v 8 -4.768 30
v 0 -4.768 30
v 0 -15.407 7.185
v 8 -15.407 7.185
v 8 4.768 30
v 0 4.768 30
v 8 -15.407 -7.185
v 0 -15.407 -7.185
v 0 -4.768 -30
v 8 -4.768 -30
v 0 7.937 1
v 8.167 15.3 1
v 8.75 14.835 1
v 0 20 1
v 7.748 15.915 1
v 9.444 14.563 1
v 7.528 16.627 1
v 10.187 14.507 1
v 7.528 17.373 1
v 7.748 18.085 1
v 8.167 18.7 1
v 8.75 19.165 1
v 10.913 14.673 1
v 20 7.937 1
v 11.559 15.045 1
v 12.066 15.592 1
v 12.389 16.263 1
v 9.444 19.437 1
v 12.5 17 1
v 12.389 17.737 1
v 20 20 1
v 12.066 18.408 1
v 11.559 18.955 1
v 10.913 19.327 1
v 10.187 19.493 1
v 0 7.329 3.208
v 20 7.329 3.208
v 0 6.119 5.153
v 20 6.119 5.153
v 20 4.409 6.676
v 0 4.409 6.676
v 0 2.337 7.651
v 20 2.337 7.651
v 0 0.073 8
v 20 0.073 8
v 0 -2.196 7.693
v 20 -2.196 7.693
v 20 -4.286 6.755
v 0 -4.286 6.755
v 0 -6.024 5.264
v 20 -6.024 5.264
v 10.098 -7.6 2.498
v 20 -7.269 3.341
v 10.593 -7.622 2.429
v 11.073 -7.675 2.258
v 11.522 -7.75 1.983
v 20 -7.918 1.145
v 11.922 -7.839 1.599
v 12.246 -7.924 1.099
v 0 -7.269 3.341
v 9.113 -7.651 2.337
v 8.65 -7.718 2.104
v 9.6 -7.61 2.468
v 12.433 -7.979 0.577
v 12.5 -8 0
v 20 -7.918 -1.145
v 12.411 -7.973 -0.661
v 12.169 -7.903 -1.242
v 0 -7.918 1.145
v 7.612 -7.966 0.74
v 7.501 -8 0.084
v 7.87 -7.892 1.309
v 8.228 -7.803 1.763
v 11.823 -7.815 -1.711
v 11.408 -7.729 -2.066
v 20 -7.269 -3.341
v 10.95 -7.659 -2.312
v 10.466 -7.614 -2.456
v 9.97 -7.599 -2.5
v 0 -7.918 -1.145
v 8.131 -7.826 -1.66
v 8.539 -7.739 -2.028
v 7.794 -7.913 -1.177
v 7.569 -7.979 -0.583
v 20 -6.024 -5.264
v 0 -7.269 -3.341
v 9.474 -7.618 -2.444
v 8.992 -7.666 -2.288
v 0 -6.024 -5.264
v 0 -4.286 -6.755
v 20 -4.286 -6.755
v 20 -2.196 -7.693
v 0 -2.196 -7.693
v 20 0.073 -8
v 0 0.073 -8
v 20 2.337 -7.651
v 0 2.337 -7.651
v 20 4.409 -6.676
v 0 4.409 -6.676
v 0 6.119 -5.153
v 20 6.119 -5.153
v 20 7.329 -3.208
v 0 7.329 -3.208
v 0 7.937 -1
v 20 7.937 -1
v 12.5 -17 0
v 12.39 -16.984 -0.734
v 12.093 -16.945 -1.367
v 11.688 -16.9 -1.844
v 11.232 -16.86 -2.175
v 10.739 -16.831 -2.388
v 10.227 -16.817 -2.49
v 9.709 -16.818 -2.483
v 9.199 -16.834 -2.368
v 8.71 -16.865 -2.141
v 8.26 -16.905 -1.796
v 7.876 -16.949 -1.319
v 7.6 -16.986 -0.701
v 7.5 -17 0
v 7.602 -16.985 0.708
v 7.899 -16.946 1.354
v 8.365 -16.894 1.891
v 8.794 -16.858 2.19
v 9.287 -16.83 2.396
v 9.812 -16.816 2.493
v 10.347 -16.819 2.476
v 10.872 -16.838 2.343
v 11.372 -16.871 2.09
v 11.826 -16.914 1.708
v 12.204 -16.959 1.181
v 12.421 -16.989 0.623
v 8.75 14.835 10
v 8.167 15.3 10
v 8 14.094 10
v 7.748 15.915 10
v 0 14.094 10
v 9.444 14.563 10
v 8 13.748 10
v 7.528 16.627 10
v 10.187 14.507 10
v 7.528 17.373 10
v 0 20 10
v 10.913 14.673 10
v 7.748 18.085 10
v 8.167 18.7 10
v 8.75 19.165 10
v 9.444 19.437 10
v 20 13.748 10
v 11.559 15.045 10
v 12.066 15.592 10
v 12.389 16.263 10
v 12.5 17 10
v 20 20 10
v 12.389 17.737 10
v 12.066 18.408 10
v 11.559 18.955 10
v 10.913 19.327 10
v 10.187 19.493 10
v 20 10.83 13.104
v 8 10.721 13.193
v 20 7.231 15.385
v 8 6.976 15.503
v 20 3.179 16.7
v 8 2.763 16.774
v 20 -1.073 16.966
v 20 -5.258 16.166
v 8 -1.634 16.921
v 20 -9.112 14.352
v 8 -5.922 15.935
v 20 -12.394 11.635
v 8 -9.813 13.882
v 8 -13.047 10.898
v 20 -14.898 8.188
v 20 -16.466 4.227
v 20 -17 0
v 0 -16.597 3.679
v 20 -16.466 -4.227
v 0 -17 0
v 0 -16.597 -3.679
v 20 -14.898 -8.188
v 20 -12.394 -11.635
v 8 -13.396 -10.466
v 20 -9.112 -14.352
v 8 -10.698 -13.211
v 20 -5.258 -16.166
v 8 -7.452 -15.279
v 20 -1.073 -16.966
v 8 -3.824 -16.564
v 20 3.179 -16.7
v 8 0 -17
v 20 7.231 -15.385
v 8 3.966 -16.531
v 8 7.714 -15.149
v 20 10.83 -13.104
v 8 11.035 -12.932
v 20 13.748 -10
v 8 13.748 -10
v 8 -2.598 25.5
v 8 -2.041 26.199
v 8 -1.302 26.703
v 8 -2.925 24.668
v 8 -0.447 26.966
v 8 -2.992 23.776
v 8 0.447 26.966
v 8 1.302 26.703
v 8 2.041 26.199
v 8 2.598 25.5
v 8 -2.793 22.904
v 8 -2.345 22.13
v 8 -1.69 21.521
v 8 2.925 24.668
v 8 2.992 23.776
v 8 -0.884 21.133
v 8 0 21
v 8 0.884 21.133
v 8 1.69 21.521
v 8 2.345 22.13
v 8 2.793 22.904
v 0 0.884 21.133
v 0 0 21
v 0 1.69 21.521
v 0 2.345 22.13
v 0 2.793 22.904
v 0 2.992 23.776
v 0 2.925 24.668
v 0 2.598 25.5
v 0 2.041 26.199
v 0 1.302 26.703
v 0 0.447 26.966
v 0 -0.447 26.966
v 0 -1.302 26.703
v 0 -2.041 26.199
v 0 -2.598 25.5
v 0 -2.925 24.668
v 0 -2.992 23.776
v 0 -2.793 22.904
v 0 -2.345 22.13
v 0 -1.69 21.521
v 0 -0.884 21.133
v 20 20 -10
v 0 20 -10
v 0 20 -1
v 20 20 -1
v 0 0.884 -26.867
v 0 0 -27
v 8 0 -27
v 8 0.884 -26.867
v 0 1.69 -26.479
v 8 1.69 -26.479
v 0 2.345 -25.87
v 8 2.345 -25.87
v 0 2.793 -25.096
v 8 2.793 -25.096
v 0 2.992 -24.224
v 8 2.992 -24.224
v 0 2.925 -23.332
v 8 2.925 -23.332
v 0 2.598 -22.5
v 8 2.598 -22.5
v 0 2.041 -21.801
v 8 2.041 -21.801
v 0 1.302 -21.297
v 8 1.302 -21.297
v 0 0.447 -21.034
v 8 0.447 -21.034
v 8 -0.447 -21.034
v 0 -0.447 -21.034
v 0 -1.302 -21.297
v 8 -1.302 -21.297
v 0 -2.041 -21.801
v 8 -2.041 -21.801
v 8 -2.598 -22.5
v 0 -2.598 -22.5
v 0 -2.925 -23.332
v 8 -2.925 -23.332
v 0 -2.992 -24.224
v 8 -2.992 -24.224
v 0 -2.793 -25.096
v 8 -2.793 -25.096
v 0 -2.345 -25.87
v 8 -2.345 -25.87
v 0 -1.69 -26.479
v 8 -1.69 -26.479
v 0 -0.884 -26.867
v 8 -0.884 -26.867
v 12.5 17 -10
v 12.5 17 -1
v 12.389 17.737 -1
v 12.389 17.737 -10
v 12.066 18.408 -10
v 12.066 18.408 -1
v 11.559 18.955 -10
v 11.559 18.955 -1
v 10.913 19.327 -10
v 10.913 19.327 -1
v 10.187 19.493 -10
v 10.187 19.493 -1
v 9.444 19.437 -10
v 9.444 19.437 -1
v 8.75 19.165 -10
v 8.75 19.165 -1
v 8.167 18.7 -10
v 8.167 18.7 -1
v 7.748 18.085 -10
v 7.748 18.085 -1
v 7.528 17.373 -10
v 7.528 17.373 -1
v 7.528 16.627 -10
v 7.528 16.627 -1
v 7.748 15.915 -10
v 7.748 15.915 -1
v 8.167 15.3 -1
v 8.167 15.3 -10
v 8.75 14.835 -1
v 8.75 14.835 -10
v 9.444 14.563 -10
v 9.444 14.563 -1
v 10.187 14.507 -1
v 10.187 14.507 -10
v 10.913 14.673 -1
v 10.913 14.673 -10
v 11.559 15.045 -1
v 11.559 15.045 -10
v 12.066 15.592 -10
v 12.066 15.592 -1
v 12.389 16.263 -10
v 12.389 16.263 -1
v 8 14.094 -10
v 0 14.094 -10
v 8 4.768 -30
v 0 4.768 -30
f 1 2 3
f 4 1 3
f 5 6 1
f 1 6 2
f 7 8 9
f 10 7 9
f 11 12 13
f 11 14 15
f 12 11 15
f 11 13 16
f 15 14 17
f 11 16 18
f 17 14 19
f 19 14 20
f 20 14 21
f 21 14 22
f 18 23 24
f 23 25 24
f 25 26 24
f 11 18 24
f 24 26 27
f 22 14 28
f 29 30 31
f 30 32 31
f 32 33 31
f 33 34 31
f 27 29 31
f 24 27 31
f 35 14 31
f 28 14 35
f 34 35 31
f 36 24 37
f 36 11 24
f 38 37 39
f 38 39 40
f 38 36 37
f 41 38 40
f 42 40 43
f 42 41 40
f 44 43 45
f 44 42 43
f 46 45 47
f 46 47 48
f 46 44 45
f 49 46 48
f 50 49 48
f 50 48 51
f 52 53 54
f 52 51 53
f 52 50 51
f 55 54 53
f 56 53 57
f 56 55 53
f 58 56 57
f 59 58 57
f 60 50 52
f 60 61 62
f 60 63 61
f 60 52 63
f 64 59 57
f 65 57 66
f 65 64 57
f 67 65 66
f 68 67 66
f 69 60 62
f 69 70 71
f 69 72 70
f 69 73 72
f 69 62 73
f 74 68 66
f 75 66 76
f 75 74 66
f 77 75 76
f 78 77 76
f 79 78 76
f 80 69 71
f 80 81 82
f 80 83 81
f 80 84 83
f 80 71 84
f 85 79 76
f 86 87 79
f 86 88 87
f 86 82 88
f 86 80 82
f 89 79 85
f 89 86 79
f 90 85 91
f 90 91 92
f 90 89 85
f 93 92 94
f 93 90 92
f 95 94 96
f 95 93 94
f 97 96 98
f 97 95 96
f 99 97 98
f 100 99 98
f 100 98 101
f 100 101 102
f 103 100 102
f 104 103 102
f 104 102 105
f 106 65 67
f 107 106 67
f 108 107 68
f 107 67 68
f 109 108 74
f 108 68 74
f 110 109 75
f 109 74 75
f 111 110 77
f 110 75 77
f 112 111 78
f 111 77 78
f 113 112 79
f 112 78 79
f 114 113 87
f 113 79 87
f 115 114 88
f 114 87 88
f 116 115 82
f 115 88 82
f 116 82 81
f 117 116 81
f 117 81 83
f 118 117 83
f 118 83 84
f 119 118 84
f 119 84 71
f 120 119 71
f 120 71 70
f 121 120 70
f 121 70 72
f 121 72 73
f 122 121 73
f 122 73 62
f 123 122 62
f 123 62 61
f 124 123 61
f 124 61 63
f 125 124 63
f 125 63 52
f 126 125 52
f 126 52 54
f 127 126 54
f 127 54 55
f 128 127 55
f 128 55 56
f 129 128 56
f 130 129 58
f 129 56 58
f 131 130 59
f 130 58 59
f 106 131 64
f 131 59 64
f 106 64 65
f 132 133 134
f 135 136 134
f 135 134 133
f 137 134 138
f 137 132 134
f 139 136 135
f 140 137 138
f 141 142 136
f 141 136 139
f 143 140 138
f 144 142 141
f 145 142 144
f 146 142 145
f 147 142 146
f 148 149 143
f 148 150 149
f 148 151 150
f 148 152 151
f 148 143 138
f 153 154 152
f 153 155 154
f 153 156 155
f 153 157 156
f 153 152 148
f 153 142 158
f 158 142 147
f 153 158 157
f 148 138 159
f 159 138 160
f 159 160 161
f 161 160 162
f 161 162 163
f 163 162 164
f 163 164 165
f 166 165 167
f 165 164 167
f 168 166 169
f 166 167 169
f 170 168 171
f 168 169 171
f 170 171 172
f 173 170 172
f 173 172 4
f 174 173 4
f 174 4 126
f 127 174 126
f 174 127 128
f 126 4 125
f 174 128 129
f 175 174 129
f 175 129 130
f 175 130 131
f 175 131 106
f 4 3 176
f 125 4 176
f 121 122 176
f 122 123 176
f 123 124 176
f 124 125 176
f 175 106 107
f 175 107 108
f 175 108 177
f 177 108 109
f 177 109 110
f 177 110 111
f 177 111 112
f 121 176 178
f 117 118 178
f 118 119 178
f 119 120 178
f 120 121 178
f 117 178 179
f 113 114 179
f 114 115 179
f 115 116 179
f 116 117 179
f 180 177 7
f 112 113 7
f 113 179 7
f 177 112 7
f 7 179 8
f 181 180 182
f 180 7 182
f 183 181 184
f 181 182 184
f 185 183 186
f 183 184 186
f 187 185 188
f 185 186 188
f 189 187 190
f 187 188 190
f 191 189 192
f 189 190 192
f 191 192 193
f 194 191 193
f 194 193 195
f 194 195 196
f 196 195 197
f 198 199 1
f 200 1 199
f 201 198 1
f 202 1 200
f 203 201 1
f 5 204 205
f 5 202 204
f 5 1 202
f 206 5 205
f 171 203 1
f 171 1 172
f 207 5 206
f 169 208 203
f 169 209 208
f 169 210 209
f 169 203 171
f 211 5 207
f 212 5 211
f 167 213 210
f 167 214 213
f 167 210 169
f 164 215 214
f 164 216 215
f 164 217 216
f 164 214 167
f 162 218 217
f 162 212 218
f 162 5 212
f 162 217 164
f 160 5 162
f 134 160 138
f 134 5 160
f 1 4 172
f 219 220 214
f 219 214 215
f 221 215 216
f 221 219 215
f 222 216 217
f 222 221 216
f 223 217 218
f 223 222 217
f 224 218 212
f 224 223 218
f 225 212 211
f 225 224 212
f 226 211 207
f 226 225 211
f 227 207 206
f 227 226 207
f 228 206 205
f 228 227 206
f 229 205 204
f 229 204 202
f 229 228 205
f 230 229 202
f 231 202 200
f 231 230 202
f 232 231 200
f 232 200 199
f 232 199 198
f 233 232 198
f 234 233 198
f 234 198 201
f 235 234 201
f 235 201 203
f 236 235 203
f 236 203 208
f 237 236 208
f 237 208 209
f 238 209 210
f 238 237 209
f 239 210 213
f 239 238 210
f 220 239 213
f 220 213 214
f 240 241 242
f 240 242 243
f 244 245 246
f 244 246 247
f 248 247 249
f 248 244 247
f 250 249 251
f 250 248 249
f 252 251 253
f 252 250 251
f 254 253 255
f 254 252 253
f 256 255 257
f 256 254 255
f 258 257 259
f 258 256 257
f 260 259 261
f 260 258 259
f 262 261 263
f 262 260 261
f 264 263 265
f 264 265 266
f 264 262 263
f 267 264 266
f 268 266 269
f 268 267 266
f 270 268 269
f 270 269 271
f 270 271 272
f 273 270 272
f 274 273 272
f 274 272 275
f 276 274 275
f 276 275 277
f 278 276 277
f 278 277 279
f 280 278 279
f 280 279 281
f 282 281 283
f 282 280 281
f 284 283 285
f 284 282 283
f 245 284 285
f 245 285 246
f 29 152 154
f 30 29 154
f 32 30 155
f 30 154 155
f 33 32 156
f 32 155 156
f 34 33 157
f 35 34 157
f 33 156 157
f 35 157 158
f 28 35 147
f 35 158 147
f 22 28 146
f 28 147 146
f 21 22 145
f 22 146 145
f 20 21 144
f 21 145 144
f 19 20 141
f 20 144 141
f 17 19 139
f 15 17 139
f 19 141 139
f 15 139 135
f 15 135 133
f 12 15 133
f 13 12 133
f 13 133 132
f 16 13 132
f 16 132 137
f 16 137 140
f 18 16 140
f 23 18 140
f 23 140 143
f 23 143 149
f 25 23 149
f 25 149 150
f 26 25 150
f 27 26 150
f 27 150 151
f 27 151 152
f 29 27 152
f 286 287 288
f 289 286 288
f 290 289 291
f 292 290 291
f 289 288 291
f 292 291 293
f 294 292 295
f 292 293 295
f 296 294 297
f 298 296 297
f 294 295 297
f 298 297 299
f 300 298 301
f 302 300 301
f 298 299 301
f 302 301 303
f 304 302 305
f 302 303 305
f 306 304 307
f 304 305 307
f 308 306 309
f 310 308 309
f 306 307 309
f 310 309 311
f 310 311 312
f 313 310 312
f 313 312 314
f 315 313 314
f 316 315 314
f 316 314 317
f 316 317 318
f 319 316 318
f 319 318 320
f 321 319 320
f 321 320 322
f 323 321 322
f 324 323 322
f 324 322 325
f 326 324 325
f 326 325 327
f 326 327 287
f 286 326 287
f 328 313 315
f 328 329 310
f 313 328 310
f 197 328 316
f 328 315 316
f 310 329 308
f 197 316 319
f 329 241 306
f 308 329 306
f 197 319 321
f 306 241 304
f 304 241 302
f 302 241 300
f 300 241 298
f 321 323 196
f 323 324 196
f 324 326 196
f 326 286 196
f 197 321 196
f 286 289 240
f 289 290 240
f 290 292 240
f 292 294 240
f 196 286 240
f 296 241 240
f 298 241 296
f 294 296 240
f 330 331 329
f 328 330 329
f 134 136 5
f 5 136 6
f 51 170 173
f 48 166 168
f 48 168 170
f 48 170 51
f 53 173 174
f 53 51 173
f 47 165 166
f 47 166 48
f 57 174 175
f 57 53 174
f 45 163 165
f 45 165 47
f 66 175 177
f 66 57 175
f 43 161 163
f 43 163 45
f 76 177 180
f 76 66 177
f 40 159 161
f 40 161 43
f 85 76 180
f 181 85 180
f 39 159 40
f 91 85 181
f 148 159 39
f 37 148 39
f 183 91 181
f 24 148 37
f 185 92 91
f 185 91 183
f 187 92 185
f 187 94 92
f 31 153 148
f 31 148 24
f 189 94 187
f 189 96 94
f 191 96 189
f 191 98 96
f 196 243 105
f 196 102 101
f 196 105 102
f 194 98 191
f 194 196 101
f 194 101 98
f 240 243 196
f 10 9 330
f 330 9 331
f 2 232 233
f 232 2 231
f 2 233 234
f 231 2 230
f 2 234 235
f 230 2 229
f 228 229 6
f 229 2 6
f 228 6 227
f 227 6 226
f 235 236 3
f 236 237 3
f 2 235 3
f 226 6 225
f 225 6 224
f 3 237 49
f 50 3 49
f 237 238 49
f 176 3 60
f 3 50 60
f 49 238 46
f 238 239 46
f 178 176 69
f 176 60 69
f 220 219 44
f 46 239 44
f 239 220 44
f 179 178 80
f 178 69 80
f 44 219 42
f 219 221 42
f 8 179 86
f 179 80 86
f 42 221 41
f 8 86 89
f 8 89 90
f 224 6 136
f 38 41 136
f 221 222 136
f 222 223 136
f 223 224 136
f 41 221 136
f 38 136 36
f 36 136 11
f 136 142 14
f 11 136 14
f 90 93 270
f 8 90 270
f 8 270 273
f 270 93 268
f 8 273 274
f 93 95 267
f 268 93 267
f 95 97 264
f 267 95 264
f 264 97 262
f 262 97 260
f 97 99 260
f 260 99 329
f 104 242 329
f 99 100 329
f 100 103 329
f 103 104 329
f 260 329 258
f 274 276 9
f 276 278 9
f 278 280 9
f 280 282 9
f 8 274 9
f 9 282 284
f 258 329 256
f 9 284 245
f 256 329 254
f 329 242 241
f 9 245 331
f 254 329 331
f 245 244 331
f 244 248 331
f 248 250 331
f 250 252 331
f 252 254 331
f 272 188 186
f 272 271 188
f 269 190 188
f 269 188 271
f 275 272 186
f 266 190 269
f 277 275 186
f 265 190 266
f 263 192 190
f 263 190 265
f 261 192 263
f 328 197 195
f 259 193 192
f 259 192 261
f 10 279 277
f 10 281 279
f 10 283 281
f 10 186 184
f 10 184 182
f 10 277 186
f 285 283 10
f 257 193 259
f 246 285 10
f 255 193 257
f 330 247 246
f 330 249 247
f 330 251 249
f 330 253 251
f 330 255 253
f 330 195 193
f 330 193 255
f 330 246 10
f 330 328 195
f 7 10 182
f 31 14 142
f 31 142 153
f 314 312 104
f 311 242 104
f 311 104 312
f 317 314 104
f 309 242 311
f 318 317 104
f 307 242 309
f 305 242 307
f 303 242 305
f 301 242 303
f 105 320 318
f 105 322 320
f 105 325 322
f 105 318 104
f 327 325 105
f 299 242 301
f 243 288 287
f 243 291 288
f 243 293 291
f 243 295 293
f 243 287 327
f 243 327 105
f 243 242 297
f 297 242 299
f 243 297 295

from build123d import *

# Parameters (mm, degrees)
SKETCH_1_R          = 3
EXTRUDE_1_DEPTH     = 8
EXTRUDE_1_2_DEPTH   = 8
SKETCH_1_3_R        = 8
EXTRUDE_2_DEPTH     = 20
EXTRUDE_3_REACH     = 53.662
SKETCH_2_W          = 20
SKETCH_2_H          = 20
SKETCH_3_W          = 20
SKETCH_3_H          = 2
CUT_EXTRUDE_1_DEPTH = 20
SKETCH_4_R          = 2.5
CUT_EXTRUDE_2_DEPTH = 49.989794856
SKETCH_5_R          = 2.5
CUT_EXTRUDE_3_DEPTH = 42.231056256


with BuildPart() as part:
    # 草图1 → 凸台-拉伸1 (new body)
    with BuildSketch(Plane(origin=(0, 0, 0), x_dir=(0, 0, -1), z_dir=(1, 0, 0))):
        with BuildLine():
            Line((-7.18451045, 15.40723238), (-30, 4.768194878))
            Line((-30, 4.768194878), (-30, -4.768194878))
            Line((-30, -4.768194878), (-7.18451045, -15.40723238))
            ThreePointArc((-7.18451045, -15.40723238), (-17, 0), (-7.18451045, 15.40723238))
        make_face()
        with Locations((-24, 0)):
            Circle(SKETCH_1_R, mode=Mode.SUBTRACT)
    extrude(amount=EXTRUDE_1_DEPTH)



with BuildPart() as body_2:
    # 草图1 → Extrude 1 2 (new body)
    with BuildSketch(Plane(origin=(0, 0, 0), x_dir=(0, 0, -1), z_dir=(1, 0, 0))):
        with BuildLine():
            Line((30, 4.768194878), (7.18451045, 15.40723238))
            ThreePointArc((7.18451045, 15.40723238), (17, 0), (7.18451045, -15.40723238))
            Line((7.18451045, -15.40723238), (30, -4.768194878))
            Line((30, -4.768194878), (30, 4.768194878))
        make_face()
        with Locations((24, 0)):
            Circle(SKETCH_1_R, mode=Mode.SUBTRACT)
    extrude(amount=EXTRUDE_1_2_DEPTH)


with BuildPart() as part_1:
    add(part.part)

    add(body_2.part)  # 凸台-拉伸2 merges body 2
    # 草图1<3> → 凸台-拉伸2 (add)
    with BuildSketch(Plane(origin=(0, 0, 0), x_dir=(0, 0, -1), z_dir=(1, 0, 0))):
        with BuildLine():
            ThreePointArc((7.18451045, 15.40723238), (0, 17), (-7.18451045, 15.40723238))
            ThreePointArc((-7.18451045, 15.40723238), (-17, 0), (-7.18451045, -15.40723238))
            ThreePointArc((-7.18451045, -15.40723238), (0, -17), (7.18451045, -15.40723238))
            ThreePointArc((7.18451045, -15.40723238), (14.337654579, -9.134093342), (17, 0))
            ThreePointArc((17, 0), (14.337654579, 9.134093342), (7.18451045, 15.40723238))
        make_face()
        Circle(SKETCH_1_3_R, mode=Mode.SUBTRACT)
    extrude(amount=EXTRUDE_2_DEPTH)

    # 草图2 → 凸台-拉伸3 (add, up to next)
    with BuildSketch(Plane(origin=(0, 20, 0), x_dir=(1, 0, 0), z_dir=(0, 1, 0)), mode=Mode.PRIVATE) as extrude_3_sk1:
        with Locations((10, 0)):
            Rectangle(SKETCH_2_W, SKETCH_2_H)
    extrude_3_tool1 = extrude(extrude_3_sk1.sketch, amount=-EXTRUDE_3_REACH, mode=Mode.PRIVATE) - part_1.part
    add(extrude_3_tool1.solids().sort_by_distance((10, 20, 0))[0])

    # 草图3 → 切除-拉伸1 (cut)
    with BuildSketch(Plane(origin=(0, 20, 0), x_dir=(1, 0, 0), z_dir=(0, 1, 0))):
        with Locations((10, 0)):
            Rectangle(SKETCH_3_W, SKETCH_3_H)
    extrude(amount=-CUT_EXTRUDE_1_DEPTH, mode=Mode.SUBTRACT)

    # 草图4 → 切除-拉伸2 (cut, through all)
    with BuildSketch(Plane.XY.offset(10)):
        with Locations((10, 17)):
            Circle(SKETCH_4_R)
    extrude(amount=-CUT_EXTRUDE_2_DEPTH, mode=Mode.SUBTRACT)

    # 草图5 → 切除-拉伸3 (cut, through all)
    with BuildSketch(Plane(origin=(0, 0, 0), x_dir=(1, 0, 0), z_dir=(0, 1, 0))):
        with Locations((10, 0)):
            Circle(SKETCH_5_R)
    extrude(amount=-CUT_EXTRUDE_3_DEPTH, mode=Mode.SUBTRACT)


solid = part_1.part
